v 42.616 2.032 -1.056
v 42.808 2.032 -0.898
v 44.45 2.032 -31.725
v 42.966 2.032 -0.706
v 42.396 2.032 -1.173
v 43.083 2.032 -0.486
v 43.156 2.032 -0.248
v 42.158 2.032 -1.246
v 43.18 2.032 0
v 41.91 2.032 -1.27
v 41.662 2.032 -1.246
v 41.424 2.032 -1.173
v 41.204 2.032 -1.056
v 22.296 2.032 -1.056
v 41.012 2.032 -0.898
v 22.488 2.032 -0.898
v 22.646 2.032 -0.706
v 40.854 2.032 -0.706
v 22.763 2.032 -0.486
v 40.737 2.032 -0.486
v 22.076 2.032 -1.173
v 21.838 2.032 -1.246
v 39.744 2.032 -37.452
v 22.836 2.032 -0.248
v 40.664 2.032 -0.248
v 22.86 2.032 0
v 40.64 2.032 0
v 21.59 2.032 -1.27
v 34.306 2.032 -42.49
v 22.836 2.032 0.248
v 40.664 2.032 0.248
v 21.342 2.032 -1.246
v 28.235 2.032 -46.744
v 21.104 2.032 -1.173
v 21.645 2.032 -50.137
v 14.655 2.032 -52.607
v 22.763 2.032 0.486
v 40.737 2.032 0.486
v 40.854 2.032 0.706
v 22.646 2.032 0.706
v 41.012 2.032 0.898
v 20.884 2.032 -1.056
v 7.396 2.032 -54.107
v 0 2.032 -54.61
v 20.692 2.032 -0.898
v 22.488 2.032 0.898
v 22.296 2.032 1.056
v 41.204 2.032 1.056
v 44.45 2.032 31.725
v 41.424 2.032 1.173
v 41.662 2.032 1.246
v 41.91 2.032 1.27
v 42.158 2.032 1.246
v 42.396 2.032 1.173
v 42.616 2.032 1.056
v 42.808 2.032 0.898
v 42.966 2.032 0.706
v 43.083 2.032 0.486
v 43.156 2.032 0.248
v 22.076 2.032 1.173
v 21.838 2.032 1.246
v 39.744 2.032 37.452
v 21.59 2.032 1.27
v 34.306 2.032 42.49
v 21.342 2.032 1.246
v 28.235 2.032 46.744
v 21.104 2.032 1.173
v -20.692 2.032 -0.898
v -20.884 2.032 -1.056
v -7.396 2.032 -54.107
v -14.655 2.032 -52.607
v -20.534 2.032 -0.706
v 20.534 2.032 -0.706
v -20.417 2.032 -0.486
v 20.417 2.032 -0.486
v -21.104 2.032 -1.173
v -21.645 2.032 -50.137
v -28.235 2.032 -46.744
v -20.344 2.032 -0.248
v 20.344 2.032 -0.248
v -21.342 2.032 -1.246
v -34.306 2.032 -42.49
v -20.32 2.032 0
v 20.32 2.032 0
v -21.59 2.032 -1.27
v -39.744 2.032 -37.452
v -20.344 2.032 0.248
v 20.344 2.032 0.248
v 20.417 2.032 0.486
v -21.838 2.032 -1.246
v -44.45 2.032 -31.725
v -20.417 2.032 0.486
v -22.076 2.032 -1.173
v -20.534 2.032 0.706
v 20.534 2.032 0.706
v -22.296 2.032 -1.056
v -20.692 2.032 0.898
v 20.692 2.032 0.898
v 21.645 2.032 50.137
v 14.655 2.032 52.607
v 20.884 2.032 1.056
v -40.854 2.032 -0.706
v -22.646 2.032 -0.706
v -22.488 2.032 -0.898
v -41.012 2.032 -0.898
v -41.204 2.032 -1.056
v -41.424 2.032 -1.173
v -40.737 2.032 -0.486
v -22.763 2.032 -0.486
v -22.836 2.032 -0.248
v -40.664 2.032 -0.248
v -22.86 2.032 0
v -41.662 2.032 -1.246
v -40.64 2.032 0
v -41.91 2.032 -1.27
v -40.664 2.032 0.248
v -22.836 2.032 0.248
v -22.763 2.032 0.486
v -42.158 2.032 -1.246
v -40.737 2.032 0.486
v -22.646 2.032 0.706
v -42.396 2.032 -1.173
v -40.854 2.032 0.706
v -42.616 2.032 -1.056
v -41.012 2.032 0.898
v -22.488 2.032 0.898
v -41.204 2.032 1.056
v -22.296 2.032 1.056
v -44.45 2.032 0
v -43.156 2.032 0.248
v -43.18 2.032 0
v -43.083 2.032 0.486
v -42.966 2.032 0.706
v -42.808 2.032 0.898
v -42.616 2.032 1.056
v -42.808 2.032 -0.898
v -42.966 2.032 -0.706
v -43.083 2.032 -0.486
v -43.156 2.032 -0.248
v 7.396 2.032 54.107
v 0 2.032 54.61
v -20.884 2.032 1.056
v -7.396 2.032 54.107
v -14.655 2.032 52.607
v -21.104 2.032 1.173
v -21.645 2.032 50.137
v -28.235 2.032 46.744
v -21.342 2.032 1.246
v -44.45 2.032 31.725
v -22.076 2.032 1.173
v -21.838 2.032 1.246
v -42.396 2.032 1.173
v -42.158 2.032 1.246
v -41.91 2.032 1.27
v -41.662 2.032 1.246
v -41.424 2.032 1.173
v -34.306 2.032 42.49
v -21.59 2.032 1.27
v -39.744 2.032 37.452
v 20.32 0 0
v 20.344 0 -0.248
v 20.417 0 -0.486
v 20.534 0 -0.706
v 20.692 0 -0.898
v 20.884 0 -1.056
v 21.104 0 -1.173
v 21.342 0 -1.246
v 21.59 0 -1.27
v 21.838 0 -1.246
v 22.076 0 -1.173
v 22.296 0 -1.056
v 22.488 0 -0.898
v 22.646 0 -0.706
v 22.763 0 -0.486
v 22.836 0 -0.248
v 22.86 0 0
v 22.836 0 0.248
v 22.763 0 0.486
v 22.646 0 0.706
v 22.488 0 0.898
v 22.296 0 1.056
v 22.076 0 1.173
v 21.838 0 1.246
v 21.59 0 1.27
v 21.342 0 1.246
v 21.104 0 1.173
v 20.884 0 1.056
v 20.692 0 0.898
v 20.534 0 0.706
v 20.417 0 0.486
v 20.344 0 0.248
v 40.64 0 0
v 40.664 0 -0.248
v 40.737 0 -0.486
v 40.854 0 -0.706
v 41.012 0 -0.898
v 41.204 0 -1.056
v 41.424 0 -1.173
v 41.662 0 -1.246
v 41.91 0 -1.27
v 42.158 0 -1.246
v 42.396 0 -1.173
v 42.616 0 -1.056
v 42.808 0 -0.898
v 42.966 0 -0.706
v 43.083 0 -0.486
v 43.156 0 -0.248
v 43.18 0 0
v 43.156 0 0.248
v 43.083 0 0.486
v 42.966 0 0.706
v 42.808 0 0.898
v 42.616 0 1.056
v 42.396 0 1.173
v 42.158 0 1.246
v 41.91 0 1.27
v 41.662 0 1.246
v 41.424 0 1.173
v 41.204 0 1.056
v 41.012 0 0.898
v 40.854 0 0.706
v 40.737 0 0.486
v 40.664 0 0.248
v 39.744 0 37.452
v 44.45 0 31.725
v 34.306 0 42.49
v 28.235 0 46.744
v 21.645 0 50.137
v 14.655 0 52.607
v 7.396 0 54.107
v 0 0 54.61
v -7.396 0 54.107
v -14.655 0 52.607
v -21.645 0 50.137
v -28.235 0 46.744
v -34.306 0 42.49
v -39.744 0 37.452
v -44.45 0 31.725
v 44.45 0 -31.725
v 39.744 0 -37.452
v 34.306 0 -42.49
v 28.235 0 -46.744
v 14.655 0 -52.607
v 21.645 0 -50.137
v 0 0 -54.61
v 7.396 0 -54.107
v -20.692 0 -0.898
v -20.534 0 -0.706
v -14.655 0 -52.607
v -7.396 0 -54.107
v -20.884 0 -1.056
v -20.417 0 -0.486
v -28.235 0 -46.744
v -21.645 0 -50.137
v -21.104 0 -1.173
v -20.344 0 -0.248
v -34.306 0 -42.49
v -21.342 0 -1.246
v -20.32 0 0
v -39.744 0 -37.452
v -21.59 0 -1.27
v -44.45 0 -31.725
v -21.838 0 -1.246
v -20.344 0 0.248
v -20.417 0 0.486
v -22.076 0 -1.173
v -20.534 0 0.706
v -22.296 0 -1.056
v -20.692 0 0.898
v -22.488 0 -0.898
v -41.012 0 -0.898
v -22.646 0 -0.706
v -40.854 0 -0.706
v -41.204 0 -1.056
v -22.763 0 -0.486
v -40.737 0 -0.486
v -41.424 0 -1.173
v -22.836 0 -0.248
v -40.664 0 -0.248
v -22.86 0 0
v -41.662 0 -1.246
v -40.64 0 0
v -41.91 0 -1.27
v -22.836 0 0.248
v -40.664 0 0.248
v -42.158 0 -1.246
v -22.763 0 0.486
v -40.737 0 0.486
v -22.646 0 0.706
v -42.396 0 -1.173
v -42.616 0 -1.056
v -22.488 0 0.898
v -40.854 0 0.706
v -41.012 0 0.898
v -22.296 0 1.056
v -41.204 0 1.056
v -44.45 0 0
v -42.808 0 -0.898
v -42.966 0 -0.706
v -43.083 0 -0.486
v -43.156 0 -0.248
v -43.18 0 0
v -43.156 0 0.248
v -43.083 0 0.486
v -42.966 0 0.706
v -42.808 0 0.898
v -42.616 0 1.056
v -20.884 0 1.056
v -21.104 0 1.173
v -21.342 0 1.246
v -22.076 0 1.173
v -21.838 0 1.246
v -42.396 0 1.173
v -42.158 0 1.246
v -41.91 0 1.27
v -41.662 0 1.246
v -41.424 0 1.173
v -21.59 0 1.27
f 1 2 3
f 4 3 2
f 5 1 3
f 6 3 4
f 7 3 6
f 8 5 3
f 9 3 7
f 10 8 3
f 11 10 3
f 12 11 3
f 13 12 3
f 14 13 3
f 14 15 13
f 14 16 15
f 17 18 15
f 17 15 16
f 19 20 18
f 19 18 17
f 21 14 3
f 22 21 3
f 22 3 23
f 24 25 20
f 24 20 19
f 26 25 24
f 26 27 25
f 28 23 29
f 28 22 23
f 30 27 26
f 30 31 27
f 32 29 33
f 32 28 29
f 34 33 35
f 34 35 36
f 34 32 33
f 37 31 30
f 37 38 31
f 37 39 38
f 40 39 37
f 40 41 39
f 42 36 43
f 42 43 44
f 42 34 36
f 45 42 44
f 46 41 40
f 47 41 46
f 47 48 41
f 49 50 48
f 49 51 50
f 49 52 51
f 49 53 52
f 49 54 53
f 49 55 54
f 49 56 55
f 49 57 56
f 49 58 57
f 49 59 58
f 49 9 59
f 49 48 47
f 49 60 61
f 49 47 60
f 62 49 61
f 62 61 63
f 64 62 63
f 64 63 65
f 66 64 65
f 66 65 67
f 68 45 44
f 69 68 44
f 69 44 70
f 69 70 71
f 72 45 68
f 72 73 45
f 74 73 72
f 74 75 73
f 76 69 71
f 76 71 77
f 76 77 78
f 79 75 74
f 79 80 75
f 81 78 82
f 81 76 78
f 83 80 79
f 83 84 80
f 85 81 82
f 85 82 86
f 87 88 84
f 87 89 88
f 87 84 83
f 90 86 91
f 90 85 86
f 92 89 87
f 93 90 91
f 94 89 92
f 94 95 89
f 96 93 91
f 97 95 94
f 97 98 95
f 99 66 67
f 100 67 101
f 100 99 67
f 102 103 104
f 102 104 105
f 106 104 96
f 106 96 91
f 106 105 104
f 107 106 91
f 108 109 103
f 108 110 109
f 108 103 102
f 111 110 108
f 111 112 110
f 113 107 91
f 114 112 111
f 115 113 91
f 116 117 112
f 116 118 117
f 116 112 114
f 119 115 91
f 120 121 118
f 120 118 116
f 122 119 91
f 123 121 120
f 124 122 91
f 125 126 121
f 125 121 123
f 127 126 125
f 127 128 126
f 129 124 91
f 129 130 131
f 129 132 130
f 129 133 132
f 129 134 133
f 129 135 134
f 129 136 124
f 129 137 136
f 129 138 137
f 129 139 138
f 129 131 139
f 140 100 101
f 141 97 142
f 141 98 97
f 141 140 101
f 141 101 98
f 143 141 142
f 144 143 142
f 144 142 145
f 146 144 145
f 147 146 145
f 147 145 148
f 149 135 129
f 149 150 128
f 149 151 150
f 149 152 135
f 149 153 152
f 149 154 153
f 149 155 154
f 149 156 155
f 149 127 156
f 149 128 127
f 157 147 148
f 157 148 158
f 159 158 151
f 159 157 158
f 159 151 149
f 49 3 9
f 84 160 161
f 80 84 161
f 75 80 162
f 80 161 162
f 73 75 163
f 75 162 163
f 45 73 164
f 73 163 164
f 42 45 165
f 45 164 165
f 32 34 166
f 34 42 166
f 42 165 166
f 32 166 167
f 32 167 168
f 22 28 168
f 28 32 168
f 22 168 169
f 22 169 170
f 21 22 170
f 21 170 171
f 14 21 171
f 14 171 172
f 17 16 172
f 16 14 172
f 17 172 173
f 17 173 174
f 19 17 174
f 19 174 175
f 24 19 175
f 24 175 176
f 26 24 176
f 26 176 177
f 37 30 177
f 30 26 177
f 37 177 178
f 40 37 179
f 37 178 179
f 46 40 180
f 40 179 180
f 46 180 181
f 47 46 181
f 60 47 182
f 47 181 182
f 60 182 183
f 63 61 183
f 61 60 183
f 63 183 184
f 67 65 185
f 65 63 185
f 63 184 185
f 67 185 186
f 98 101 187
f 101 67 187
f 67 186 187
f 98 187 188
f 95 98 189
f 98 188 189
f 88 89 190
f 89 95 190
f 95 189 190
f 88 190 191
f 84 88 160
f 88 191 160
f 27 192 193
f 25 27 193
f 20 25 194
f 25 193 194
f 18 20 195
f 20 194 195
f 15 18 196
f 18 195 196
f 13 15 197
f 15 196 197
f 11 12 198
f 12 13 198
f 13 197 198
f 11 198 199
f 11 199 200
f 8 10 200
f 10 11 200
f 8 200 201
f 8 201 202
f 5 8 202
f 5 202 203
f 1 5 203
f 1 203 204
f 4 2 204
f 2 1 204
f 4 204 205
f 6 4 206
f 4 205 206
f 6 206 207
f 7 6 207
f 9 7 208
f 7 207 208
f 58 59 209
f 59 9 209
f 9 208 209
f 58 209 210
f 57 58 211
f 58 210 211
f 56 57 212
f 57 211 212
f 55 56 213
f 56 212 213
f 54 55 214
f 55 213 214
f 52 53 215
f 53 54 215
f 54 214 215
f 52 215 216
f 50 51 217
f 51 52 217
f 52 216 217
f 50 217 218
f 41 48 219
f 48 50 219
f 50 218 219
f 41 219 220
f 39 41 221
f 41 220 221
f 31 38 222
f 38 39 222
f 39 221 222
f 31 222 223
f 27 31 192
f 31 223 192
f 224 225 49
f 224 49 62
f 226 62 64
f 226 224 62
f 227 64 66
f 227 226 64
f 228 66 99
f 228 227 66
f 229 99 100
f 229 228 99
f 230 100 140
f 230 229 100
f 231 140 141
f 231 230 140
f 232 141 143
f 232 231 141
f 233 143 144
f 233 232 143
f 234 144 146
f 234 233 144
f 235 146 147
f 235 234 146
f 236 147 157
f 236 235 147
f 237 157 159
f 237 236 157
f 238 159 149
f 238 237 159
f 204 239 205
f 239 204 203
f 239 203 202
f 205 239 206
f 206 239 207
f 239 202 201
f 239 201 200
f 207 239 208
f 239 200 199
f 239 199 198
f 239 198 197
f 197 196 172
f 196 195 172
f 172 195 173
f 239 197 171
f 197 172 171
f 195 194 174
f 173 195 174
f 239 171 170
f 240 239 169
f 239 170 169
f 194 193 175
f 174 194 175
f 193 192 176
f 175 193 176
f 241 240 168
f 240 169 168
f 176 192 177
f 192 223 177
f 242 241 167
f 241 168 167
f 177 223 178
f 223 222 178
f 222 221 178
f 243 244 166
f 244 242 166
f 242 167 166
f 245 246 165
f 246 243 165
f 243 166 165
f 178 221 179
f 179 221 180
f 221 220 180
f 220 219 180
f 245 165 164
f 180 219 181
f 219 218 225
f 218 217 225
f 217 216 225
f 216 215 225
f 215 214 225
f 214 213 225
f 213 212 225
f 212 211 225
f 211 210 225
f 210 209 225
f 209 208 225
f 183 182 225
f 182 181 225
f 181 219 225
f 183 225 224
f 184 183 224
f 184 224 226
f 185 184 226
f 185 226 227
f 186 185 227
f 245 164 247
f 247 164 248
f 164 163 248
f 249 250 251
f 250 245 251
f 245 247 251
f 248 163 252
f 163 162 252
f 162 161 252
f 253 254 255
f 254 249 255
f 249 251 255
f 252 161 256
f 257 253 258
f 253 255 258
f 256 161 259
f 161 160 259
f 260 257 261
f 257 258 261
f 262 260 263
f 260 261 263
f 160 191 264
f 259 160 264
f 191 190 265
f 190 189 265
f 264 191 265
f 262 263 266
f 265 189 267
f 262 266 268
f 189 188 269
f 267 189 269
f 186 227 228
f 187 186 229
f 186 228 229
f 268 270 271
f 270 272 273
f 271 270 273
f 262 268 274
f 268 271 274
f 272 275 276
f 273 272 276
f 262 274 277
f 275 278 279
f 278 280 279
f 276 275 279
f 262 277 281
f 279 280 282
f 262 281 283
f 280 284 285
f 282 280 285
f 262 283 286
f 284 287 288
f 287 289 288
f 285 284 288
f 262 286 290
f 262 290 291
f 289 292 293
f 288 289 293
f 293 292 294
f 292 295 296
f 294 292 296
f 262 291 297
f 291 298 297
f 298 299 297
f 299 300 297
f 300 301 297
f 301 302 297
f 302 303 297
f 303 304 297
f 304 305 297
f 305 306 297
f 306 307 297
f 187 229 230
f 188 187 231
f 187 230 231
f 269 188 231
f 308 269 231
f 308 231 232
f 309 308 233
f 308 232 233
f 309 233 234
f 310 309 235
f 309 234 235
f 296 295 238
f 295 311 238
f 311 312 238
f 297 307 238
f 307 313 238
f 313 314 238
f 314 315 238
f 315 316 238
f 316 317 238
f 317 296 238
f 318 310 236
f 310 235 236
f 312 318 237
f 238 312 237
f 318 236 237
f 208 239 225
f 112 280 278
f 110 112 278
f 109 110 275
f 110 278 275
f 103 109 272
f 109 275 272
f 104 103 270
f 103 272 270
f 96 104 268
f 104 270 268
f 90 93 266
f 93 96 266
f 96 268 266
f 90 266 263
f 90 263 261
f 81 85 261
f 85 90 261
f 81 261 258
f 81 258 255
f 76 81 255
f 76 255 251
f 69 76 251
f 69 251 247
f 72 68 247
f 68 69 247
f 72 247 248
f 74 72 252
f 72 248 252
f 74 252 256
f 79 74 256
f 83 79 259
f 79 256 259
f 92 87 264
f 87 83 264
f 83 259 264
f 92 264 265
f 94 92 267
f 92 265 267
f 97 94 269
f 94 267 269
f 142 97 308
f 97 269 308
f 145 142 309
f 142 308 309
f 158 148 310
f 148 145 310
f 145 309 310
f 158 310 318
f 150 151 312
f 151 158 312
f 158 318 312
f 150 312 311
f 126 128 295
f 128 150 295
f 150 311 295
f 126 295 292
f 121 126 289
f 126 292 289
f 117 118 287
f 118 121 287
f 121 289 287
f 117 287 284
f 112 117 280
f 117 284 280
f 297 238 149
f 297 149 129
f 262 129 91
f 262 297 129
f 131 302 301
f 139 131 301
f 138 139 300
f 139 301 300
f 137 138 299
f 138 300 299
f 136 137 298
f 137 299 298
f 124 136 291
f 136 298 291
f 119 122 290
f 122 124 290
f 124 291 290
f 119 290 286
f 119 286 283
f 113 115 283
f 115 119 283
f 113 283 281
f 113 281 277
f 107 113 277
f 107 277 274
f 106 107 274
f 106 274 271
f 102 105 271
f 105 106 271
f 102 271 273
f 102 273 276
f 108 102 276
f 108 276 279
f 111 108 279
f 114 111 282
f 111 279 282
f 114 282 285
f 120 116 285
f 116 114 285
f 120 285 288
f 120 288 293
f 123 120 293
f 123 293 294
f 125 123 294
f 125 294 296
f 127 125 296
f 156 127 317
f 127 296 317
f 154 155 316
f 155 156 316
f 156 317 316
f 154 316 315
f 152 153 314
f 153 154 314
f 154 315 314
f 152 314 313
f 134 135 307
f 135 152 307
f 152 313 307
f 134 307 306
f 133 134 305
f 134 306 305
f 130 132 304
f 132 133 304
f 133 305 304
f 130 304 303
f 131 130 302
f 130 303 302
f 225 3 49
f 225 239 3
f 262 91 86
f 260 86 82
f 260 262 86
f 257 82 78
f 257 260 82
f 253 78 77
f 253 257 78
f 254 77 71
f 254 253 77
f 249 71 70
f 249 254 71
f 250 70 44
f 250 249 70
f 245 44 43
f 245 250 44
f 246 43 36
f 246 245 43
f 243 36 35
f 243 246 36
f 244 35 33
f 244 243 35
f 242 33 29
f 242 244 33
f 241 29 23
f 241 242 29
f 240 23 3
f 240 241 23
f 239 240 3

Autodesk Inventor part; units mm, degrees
ref_plane "YZ Plane" through (0, 0, 0) normal (1, 0, 0) x (0, 1, 0)
ref_plane "XZ Plane" through (0, 0, 0) normal (0, 1, 0) x (-1, 0, 0)
ref_plane "XY Plane" through (0, 0, 0) normal (0, 0, 1) x (1, 0, 0)
sketch "Sketch1" plane through (0, 0, 0) normal (0, 1, 0) x (-1, 0, 0)
  line L0 (44.45, 31.7246) -> (44.45, -31.7246)
  line L1 (-44.45, -31.7246) -> (-44.45, 31.7246)
  arc A0 (-44.45, -31.7246) -> (44.45, -31.7246) centre (0, 0) ccw
  arc A1 (44.45, 31.7246) -> (-44.45, 31.7246) centre (0, 0) ccw
  line L2 (44.45, 0) -> (41.91, 0)
  circle A2 centre (41.91, 0) radius 1.27
  line L3 (41.91, 0) -> (21.59, 0)
  circle A3 centre (21.59, 0) radius 1.27
  line L4 (0, -54.61) -> (0, 54.61)
  circle A4 centre (-41.91, 0) radius 1.27
  circle A5 centre (-21.59, 0) radius 1.27
  dimension "d3" = 88.9
  dimension "d4" = 2.54
  dimension "d5" = 2.54
  dimension "d6" = 20.32
  dimension "d7" = 2.54
extrude "Extrusion1" add sketch "Sketch1" along normal blind 2.032
properties part number "Top Plate"
